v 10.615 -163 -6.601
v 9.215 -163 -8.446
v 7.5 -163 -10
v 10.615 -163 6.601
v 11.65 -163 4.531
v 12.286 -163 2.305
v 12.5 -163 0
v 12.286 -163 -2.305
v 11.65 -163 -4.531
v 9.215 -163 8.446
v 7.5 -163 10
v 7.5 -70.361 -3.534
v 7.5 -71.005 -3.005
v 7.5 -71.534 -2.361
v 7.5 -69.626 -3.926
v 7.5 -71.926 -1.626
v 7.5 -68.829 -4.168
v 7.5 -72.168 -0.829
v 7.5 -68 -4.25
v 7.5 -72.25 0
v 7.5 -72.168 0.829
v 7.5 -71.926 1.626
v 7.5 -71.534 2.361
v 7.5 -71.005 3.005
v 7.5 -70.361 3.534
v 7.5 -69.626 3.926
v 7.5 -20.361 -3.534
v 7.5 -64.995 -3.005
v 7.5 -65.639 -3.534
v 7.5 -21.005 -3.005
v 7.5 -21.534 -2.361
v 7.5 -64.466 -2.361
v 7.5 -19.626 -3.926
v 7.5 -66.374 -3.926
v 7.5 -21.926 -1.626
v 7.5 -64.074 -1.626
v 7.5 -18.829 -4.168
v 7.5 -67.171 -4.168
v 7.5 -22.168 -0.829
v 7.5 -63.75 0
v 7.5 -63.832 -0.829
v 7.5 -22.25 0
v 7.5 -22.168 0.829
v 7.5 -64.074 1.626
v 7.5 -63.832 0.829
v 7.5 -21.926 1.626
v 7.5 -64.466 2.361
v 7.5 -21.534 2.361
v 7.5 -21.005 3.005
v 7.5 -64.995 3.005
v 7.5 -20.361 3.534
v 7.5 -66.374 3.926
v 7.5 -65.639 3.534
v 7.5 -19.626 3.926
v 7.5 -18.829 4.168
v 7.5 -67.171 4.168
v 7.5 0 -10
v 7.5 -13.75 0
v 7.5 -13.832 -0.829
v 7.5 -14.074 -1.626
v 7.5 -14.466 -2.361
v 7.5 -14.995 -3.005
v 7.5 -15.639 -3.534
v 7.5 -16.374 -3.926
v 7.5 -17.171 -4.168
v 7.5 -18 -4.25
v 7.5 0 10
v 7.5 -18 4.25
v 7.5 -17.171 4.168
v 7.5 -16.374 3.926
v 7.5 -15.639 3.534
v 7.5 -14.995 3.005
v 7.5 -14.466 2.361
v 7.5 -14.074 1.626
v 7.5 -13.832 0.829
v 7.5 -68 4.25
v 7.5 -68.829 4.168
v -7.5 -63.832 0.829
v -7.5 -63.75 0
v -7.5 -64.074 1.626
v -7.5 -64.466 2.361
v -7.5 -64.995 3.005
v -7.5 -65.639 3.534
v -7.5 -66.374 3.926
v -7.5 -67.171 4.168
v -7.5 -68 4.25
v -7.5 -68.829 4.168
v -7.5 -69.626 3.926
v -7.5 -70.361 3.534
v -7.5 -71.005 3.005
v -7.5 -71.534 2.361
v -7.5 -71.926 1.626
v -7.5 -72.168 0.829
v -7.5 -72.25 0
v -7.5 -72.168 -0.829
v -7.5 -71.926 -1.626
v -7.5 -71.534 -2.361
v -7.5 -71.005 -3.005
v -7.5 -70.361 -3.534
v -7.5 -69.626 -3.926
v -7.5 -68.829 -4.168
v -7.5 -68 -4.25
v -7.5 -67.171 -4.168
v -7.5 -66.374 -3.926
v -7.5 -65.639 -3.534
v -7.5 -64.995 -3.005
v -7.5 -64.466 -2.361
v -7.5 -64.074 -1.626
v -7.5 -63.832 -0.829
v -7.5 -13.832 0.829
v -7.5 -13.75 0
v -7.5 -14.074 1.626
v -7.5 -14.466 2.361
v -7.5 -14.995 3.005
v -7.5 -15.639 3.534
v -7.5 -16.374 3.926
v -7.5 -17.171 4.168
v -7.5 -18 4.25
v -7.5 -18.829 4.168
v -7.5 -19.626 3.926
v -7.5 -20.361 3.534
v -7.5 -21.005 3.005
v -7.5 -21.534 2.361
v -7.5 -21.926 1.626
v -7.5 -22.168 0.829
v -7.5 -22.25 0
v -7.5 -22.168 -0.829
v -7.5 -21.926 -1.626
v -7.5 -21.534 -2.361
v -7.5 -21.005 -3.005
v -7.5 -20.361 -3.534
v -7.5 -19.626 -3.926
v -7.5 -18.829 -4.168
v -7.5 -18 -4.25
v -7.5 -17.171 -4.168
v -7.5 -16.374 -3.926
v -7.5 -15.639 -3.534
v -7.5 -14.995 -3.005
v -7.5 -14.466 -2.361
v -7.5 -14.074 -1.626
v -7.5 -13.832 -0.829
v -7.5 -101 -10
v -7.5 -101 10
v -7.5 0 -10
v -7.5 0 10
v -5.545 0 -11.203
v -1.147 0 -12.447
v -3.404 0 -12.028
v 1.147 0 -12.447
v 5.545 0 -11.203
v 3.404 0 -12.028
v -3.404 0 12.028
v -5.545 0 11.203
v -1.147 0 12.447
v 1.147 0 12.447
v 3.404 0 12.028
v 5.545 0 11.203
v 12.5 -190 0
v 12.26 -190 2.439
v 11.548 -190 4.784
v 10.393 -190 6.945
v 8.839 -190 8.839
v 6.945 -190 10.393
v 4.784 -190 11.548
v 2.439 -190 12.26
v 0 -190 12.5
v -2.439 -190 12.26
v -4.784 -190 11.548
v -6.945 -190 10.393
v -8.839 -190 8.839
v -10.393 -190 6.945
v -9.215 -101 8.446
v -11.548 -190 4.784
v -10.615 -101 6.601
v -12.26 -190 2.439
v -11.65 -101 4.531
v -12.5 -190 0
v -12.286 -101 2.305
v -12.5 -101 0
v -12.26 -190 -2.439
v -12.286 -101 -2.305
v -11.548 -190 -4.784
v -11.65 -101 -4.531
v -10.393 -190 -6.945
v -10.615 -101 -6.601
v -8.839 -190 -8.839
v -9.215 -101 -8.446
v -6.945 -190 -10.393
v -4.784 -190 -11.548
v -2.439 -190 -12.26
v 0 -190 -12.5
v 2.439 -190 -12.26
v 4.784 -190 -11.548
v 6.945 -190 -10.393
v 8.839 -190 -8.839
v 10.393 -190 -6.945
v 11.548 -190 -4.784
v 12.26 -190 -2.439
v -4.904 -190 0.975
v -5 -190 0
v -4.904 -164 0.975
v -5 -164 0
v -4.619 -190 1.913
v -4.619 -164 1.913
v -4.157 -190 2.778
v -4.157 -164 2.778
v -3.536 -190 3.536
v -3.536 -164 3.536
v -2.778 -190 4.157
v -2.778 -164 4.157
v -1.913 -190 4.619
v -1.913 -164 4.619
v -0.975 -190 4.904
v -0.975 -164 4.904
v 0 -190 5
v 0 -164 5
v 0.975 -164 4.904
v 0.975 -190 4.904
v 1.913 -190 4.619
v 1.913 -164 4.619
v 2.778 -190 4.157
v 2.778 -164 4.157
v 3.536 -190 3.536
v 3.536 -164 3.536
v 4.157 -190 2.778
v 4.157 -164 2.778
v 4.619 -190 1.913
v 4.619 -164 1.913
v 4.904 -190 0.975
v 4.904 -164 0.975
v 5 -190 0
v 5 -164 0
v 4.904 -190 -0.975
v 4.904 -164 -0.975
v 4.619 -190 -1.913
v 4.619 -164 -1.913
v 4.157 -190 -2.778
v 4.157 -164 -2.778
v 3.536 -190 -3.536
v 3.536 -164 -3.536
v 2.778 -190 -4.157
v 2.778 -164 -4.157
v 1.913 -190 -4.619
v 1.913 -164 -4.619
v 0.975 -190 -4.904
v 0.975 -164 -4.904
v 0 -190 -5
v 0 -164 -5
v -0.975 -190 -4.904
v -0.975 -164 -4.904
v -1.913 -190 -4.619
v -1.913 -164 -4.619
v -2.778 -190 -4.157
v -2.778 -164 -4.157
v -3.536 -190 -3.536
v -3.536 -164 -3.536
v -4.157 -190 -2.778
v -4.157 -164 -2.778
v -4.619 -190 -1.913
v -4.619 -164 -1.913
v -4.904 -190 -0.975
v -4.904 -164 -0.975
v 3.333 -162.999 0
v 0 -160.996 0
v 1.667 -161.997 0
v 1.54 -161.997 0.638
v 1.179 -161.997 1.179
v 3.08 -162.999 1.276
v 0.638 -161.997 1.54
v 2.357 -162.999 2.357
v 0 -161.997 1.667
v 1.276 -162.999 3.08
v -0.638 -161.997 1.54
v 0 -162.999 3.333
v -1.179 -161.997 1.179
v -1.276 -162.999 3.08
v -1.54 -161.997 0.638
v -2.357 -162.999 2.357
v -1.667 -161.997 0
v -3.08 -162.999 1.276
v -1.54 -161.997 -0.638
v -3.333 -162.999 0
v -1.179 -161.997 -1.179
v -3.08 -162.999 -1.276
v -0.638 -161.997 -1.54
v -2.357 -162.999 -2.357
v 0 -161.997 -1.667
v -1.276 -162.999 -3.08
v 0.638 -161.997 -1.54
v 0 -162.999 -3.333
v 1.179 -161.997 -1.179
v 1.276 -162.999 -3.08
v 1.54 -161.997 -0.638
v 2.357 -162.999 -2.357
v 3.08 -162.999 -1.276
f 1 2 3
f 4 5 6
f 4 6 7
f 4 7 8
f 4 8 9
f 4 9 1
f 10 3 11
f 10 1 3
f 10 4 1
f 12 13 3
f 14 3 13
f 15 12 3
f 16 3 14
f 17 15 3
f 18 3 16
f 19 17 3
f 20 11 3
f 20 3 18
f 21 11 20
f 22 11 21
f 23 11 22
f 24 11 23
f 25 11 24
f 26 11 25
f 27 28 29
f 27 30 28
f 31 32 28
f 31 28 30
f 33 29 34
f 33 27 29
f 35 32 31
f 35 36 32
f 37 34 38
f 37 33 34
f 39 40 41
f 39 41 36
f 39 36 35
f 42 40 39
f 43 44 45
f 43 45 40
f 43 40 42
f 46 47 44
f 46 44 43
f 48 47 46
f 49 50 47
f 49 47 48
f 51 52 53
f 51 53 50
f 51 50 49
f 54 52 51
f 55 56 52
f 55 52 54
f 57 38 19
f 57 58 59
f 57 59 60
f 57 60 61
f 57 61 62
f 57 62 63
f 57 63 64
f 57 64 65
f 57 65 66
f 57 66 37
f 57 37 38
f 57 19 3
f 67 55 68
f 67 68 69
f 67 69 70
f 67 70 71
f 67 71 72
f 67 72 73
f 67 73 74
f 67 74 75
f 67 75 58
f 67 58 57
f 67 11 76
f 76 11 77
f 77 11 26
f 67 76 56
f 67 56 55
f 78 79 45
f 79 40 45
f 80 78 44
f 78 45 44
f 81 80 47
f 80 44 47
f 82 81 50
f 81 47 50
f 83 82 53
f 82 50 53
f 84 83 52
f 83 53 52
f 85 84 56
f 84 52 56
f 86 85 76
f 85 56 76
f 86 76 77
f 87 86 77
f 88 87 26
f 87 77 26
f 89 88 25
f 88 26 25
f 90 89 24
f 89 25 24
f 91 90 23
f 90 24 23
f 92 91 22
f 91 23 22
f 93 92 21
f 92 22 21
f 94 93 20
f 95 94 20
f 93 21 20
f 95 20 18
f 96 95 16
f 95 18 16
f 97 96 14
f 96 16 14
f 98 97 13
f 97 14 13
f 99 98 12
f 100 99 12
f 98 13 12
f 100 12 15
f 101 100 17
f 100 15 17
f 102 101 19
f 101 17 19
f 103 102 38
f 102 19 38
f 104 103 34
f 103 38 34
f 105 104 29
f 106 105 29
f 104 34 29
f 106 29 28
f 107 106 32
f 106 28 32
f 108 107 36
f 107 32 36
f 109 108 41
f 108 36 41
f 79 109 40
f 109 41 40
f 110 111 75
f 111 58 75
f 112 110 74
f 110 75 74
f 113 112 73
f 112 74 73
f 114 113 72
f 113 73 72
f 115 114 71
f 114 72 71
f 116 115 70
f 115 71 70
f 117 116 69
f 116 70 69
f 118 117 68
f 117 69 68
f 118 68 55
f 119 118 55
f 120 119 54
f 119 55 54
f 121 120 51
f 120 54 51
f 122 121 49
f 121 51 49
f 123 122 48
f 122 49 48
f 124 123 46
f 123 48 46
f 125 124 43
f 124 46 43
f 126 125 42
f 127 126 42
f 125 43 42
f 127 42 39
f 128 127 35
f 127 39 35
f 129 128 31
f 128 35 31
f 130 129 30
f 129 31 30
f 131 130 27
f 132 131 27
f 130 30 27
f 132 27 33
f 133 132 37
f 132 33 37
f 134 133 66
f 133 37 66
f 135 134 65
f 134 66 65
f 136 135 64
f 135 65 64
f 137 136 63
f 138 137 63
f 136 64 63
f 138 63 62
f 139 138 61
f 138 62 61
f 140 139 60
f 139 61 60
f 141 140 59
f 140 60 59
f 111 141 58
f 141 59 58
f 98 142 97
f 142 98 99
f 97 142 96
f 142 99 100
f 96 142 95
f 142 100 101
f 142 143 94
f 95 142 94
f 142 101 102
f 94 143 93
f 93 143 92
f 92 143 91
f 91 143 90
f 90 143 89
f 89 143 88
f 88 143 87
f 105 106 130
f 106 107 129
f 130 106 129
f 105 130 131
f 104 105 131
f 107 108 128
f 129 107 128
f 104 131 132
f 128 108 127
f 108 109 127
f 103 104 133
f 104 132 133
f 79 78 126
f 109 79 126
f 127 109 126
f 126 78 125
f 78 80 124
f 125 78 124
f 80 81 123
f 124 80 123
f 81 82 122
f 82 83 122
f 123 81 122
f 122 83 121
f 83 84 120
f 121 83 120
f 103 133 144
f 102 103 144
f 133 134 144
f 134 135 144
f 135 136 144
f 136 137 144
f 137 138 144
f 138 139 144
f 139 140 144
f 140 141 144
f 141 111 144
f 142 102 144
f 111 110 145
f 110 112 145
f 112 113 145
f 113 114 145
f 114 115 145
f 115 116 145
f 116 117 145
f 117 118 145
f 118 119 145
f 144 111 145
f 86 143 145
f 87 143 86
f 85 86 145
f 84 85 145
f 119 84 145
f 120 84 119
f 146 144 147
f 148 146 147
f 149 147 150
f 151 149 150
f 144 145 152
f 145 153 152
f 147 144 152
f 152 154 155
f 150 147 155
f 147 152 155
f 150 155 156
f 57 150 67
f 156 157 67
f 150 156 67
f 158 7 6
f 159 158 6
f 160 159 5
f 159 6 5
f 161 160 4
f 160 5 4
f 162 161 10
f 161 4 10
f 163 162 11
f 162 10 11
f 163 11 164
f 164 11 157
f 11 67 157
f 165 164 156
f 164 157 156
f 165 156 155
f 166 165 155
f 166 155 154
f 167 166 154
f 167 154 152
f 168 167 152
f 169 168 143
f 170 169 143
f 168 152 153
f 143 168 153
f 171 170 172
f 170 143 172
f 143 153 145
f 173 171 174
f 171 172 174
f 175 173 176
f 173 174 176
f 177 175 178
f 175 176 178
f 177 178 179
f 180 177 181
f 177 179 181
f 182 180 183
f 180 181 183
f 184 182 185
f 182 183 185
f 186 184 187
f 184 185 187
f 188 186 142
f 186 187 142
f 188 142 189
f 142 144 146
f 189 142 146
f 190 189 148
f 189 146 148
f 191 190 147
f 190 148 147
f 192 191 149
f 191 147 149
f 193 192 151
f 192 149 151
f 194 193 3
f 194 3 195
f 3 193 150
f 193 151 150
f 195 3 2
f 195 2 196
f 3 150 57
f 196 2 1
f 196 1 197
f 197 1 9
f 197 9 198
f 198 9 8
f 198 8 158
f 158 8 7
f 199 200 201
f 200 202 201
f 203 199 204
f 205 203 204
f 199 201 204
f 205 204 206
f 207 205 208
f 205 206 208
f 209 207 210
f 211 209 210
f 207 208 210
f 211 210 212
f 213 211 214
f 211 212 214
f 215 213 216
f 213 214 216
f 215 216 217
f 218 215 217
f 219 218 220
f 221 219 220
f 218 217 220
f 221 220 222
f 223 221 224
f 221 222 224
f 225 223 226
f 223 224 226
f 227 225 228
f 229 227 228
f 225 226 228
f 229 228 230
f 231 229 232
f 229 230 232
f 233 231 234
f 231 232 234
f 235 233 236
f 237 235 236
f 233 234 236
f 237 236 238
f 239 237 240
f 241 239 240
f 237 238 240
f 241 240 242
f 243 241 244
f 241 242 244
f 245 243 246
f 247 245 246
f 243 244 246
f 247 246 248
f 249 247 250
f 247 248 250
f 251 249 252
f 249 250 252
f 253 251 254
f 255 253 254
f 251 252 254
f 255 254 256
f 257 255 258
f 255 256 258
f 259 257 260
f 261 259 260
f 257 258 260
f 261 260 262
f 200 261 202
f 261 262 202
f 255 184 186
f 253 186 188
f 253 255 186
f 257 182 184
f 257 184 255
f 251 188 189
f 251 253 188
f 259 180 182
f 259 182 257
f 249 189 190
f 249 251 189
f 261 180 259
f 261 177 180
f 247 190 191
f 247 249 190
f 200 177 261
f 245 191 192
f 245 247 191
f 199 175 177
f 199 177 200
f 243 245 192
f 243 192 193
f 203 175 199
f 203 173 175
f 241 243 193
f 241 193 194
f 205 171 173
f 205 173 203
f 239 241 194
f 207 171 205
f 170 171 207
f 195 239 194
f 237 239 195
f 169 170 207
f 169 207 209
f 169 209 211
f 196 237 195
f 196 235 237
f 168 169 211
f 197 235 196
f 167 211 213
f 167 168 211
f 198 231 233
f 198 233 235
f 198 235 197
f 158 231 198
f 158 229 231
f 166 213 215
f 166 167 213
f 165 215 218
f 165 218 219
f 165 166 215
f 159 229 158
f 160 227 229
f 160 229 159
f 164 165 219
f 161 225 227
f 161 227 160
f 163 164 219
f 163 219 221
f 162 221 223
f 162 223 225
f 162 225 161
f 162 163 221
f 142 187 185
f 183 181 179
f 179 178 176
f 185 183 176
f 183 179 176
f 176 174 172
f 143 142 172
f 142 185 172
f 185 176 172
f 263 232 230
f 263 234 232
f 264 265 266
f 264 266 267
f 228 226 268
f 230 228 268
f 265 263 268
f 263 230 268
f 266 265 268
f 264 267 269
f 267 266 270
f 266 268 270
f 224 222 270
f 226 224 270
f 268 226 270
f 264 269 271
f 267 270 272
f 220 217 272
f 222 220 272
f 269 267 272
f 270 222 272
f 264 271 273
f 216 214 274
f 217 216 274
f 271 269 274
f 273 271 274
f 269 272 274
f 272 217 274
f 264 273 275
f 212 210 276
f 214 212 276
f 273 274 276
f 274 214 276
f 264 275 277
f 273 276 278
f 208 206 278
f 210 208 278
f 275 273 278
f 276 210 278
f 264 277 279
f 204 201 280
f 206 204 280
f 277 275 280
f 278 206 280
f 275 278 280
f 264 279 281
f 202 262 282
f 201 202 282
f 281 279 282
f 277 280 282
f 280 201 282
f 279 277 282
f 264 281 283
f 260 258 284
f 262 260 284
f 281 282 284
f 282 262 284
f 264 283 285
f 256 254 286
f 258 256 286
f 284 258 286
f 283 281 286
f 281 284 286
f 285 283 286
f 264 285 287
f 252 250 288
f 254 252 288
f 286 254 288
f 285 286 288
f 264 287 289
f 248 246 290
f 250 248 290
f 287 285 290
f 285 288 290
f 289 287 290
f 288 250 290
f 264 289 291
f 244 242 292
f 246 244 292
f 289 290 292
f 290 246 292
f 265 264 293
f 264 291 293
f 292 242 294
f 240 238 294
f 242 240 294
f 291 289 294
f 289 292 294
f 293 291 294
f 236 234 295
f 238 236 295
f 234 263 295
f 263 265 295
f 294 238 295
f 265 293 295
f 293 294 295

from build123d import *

# Parameters (mm, degrees)
F0_R          = 12.5
F1_DEPTH      = 190
F3_D          = 10
F3_DEPTH      = 26
F3_TIP        = 3.0043030951
F4_R          = 4.25
F5_DEPTH      = 25
F5_DEPTH_BACK = 25
F7_W          = 101
F7_H          = 25
F8_DEPTH      = 5
F10_W         = 163
F10_H         = 25
F11_DEPTH     = 5


with BuildPart() as f1:
    # F0 (on Front) → F1 (new body)
    with BuildSketch(Plane.XZ):
        Circle(F0_R)
    extrude(amount=F1_DEPTH)

    # F3
    with Locations(Plane.XZ.offset(190)):
        with Locations((0, 0)):
            Hole(F3_D / 2, depth=F3_DEPTH)
            with Locations((0, 0, -(F3_DEPTH + F3_TIP / 2))):  # 118° drill point
                Cone(0, F3_D / 2, F3_TIP, mode=Mode.SUBTRACT)

    # F4 (on Right) → F5 (cut, two sides)
    with BuildSketch(Plane.YZ) as f5_sk:
        with Locations((-18, 0)):
            Circle(F4_R)
        with Locations((-68, 0)):
            Circle(F4_R)
    extrude(amount=-F5_DEPTH, mode=Mode.SUBTRACT)
    extrude(f5_sk.sketch, amount=F5_DEPTH_BACK, mode=Mode.SUBTRACT)

    # F7 (on offset) → F8 (cut)
    with BuildSketch(Plane.YZ.offset(-12.5)):
        with Locations((-50.5, 0)):
            Rectangle(F7_W, F7_H)
    extrude(amount=F8_DEPTH, mode=Mode.SUBTRACT)

    # F10 (on offset) → F11 (cut)
    with BuildSketch(Plane.YZ.offset(12.5)):
        with Locations((-81.5, 0)):
            Rectangle(F10_W, F10_H)
    extrude(amount=-F11_DEPTH, mode=Mode.SUBTRACT)


solid = f1.part
